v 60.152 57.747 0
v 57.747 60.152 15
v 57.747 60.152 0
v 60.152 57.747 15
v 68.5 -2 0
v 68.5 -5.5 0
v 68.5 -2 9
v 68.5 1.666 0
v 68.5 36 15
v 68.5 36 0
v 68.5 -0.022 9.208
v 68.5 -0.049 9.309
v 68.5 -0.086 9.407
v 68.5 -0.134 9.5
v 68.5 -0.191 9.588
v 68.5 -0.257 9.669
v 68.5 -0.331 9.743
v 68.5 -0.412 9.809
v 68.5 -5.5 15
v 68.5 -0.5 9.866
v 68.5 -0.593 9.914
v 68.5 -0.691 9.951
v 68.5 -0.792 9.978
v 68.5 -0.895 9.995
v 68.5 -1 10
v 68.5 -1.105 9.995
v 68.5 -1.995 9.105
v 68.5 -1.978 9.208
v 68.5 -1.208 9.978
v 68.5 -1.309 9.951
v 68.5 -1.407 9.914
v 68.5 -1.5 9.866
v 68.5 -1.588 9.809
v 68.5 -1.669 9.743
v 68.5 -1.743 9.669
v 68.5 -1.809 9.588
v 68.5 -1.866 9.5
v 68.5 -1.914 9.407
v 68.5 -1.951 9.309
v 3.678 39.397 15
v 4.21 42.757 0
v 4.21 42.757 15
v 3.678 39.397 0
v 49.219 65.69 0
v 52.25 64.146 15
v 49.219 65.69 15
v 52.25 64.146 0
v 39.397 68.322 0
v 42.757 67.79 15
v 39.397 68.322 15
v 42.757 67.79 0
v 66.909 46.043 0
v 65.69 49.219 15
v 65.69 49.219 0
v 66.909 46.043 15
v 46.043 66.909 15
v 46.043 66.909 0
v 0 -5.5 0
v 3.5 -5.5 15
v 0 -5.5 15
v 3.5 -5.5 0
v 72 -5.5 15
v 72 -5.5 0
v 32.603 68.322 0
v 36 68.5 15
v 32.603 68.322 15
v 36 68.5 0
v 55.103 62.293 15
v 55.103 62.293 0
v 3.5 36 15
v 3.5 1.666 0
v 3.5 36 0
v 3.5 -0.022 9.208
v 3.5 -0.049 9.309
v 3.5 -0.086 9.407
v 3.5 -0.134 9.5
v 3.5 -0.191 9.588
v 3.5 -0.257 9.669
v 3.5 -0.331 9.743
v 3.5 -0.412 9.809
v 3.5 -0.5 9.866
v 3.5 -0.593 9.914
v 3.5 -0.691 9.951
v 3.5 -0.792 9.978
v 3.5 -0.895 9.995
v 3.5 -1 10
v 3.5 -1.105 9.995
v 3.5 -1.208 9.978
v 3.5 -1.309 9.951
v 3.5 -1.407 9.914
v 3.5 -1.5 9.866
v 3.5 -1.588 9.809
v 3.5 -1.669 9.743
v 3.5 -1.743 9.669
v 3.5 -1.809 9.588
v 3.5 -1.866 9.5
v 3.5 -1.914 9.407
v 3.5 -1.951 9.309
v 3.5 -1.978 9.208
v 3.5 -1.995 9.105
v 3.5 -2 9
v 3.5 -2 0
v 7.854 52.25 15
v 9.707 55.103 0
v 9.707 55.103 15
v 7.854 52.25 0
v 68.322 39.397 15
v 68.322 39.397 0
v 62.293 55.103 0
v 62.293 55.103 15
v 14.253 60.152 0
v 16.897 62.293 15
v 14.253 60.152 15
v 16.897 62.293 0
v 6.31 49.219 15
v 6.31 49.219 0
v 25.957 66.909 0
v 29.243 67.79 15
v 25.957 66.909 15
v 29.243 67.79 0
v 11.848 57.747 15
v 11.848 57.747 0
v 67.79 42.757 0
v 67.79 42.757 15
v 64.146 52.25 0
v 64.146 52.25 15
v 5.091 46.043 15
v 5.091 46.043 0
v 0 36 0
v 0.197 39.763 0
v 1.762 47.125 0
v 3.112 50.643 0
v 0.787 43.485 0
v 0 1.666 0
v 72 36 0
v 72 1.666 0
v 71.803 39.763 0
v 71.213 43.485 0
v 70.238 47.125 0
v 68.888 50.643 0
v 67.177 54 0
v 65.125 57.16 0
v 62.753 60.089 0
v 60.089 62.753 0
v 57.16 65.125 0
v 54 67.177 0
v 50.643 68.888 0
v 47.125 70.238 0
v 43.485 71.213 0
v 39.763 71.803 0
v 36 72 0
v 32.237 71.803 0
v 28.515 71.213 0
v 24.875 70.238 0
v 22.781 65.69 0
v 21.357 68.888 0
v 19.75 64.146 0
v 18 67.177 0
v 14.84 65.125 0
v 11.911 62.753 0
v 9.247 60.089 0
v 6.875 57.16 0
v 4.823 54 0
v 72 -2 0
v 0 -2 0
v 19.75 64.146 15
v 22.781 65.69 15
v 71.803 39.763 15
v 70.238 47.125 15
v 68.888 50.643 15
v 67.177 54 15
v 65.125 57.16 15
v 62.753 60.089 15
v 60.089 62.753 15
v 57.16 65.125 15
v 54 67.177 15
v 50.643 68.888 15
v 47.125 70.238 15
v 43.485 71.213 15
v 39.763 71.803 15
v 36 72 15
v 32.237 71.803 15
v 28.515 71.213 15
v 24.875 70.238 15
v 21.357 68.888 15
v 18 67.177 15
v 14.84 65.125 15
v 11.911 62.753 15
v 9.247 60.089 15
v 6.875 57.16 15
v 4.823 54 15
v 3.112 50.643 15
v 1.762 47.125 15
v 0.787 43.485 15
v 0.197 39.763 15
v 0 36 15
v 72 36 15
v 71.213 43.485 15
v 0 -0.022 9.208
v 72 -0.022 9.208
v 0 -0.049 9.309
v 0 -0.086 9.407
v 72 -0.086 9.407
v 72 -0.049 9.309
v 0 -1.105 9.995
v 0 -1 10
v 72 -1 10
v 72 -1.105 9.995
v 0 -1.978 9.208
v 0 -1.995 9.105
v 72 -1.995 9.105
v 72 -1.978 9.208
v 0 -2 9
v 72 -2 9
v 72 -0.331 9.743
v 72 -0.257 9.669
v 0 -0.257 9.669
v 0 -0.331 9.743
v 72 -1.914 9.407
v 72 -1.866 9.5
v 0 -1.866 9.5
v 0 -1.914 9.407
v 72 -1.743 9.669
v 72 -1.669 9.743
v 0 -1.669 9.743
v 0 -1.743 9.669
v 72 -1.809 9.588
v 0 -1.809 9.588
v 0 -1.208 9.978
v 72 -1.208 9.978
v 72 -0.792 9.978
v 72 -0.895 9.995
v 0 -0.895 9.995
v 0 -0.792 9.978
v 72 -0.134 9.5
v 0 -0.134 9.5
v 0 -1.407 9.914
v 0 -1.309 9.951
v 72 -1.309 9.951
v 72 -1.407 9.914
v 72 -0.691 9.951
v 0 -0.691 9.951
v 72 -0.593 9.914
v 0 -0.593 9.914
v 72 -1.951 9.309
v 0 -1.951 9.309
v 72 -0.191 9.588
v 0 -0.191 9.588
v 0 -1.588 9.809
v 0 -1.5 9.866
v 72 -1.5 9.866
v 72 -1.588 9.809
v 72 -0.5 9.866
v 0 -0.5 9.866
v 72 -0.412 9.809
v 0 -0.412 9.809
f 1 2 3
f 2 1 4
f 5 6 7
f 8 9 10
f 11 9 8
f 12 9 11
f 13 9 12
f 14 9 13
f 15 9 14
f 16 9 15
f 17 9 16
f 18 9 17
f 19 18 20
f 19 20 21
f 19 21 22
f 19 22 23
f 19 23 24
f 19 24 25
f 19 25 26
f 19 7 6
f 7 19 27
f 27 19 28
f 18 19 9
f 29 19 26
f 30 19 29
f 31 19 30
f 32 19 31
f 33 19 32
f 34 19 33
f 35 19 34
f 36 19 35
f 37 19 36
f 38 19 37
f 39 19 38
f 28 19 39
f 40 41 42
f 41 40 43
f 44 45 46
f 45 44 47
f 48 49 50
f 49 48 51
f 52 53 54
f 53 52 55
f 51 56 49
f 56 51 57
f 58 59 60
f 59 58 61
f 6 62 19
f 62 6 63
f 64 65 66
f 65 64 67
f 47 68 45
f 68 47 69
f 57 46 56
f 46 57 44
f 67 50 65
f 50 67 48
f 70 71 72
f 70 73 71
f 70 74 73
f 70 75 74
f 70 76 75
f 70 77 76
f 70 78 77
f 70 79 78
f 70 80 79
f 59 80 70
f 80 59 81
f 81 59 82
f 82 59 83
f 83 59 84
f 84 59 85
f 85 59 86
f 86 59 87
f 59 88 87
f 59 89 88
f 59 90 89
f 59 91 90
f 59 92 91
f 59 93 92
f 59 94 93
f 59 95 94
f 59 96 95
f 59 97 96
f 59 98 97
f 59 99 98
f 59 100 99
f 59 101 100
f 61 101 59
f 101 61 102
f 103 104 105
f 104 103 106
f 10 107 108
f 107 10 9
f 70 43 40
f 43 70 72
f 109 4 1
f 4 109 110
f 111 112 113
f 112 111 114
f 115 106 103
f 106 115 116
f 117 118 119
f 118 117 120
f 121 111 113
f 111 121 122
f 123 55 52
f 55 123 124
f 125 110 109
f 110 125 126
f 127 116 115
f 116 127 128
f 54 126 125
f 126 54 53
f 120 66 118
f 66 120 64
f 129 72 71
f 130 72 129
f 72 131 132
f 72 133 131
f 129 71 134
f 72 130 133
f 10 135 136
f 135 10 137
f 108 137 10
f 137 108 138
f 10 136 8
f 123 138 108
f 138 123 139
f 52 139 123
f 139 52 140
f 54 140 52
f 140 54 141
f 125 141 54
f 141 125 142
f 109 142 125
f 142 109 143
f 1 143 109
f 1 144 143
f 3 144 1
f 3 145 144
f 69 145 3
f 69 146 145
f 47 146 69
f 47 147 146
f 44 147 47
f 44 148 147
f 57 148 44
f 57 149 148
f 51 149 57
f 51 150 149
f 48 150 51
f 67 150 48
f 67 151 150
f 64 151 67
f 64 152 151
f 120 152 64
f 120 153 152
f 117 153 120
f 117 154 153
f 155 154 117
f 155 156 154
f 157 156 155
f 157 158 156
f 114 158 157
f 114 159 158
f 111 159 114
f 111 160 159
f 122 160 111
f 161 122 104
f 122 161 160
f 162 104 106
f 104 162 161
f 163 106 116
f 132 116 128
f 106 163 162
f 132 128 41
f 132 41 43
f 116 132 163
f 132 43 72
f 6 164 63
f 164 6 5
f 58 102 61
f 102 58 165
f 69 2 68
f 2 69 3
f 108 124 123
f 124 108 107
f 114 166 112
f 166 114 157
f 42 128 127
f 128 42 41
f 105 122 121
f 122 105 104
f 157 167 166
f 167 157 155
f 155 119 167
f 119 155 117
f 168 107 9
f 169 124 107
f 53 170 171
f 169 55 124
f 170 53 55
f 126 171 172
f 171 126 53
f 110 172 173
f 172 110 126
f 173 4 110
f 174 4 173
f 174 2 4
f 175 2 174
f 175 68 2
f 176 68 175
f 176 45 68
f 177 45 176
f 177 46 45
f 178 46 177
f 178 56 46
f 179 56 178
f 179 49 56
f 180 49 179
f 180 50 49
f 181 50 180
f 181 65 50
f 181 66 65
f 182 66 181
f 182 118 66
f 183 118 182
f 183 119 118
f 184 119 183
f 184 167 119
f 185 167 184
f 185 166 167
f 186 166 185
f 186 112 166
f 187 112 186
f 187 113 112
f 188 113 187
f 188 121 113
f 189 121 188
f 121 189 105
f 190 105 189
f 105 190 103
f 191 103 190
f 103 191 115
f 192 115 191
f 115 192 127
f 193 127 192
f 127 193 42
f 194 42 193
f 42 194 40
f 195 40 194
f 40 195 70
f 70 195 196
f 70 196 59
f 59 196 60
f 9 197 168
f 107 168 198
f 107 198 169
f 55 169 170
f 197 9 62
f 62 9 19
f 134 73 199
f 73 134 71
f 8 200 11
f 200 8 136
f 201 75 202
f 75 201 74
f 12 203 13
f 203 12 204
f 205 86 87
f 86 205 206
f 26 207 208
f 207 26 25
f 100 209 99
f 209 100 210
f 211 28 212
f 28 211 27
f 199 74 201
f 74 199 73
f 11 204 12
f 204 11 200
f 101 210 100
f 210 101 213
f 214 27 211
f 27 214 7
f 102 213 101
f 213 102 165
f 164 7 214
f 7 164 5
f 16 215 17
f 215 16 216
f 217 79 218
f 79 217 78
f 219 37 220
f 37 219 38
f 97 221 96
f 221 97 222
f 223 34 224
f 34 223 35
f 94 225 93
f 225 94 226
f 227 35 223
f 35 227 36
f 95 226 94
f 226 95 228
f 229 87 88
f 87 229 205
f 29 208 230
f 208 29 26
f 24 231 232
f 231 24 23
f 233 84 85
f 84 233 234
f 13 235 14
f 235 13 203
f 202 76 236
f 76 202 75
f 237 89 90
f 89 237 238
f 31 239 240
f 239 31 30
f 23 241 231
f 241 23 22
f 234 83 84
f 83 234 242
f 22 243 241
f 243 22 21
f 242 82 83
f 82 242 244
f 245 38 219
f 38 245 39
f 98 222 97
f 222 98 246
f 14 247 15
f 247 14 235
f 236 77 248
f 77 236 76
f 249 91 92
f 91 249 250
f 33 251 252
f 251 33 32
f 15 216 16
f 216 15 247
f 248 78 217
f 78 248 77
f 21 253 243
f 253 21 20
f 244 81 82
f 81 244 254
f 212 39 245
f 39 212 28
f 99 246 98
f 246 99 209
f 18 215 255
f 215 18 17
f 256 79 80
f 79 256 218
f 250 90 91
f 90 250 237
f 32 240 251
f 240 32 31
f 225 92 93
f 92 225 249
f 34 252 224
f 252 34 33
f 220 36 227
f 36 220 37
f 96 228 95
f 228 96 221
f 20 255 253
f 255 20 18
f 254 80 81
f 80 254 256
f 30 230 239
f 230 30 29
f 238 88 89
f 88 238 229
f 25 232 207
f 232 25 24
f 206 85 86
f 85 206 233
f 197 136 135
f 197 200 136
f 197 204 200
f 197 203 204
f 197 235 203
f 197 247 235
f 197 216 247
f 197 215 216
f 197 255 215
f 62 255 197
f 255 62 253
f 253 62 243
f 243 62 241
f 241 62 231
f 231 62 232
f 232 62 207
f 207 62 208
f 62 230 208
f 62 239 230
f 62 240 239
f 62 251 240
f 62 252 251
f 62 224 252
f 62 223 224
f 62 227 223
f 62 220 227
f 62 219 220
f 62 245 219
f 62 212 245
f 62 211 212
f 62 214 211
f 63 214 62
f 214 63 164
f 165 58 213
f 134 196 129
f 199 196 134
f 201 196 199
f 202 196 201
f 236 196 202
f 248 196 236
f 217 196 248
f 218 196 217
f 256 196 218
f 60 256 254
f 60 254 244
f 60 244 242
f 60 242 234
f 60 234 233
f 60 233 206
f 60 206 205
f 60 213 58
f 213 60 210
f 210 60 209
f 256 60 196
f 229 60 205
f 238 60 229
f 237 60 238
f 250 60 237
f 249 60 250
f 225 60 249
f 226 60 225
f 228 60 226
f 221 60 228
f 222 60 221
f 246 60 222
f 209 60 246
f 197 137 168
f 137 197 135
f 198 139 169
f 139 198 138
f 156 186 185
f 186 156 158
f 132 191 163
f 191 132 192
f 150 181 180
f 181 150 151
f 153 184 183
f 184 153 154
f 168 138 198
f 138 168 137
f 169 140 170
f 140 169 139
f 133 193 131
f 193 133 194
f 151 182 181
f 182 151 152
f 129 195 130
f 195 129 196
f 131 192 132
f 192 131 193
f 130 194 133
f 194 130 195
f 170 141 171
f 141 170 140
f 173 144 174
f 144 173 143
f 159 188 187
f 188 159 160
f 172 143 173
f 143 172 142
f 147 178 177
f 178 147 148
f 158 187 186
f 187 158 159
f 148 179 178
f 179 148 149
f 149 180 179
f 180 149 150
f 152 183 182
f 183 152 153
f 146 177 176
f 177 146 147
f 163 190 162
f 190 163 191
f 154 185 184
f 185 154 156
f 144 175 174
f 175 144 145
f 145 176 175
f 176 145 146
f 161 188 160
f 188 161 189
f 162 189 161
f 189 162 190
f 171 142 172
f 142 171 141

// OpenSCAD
// [CZ]  Nahradni uchyt napajecky pro morcata
// [ENG] Replacement handle for guinea pigs


bottle  = 65.0;     // bottle diameter
gap     = -0.5;      // bottle distance from the cage
wire    = 2.0;      //wire diameter from the cage
height  = 15.0;     //height of the handle (gap mesh wire)
wall    = 3.5;      //the width of the wall of the handle
$fn     = 60;       //smoothness of the circle 



// varianta bey vertikalni fixace
module holder_v1()
{
    difference()
    {
        union()
        {
            hull()
            { 
                translate([((bottle/2)+wall),((bottle/2)+wall),0]) cylinder(d=(bottle+(2*wall)),h=height);
                translate([0,-(wire+wall),0]) cube([(bottle+(2*wall)),(wire+wall),height]);
            }
        }
        union()
        {
            hull()
            { 
                translate([((bottle/2)+wall),((bottle/2)+wall),0]) cylinder(d=bottle,h=height);
                translate([wall,-(wire+wall),0]) cube([bottle,(wire+wall),height]);
            }
            hull()
            {
                translate([0,-(wire/2),(height*0.6)]) rotate([0,90,0]) cylinder(d=wire,h=(bottle+(2*wall)));
                translate([0,-0,-wire]) rotate([0,90,0]) cylinder(d=(wire*2),h=(bottle+(2*wall)));
            }
        }
    }

}


holder_v1();
